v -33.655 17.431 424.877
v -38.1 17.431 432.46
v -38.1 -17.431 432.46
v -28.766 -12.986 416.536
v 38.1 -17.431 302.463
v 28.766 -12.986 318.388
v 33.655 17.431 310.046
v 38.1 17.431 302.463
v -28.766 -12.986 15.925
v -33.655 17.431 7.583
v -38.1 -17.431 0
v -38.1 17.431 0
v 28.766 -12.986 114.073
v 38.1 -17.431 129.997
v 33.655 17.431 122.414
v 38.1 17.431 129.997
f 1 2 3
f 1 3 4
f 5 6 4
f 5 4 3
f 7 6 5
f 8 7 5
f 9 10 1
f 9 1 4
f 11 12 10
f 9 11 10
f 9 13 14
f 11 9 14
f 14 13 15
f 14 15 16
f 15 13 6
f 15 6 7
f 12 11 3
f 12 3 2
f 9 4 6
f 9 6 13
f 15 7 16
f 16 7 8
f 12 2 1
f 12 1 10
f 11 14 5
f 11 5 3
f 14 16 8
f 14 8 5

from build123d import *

# Parameters (mm, degrees)
BOSS_EXTRUDE1_DEPTH     = 432.4604
CUT_EXTRUDE1_DEPTH      = 18.43075
CUT_EXTRUDE1_DEPTH_BACK = 18.43075


with BuildPart() as part:
    # Sketch1 → Boss-Extrude1 (new body)
    with BuildSketch(Plane.XY):
        Polygon((-28.7655, -12.98575), (28.7655, -12.98575), (33.655, 17.43075), (38.1, 17.43075), (38.1, -17.43075), (-38.1, -17.43075), (-38.1, 17.43075), (-33.655, 17.43075), align=None)
    extrude(amount=BOSS_EXTRUDE1_DEPTH)

    # Sketch2 → Cut-Extrude1 (cut, two sides)
    with BuildSketch(Plane(origin=(0, 0, 0), x_dir=(1, 0, 0), z_dir=(0, 1, 0))) as cut_extrude1_sk:
        Polygon((-38.1, 0), (38.1, -129.9972), (38.1, 0), align=None)
        Polygon((-38.1, -432.4604), (38.1, -302.4632), (38.1, -432.4604), align=None)
    extrude(amount=CUT_EXTRUDE1_DEPTH, mode=Mode.SUBTRACT)
    extrude(cut_extrude1_sk.sketch, amount=-CUT_EXTRUDE1_DEPTH_BACK, mode=Mode.SUBTRACT)


solid = part.part
